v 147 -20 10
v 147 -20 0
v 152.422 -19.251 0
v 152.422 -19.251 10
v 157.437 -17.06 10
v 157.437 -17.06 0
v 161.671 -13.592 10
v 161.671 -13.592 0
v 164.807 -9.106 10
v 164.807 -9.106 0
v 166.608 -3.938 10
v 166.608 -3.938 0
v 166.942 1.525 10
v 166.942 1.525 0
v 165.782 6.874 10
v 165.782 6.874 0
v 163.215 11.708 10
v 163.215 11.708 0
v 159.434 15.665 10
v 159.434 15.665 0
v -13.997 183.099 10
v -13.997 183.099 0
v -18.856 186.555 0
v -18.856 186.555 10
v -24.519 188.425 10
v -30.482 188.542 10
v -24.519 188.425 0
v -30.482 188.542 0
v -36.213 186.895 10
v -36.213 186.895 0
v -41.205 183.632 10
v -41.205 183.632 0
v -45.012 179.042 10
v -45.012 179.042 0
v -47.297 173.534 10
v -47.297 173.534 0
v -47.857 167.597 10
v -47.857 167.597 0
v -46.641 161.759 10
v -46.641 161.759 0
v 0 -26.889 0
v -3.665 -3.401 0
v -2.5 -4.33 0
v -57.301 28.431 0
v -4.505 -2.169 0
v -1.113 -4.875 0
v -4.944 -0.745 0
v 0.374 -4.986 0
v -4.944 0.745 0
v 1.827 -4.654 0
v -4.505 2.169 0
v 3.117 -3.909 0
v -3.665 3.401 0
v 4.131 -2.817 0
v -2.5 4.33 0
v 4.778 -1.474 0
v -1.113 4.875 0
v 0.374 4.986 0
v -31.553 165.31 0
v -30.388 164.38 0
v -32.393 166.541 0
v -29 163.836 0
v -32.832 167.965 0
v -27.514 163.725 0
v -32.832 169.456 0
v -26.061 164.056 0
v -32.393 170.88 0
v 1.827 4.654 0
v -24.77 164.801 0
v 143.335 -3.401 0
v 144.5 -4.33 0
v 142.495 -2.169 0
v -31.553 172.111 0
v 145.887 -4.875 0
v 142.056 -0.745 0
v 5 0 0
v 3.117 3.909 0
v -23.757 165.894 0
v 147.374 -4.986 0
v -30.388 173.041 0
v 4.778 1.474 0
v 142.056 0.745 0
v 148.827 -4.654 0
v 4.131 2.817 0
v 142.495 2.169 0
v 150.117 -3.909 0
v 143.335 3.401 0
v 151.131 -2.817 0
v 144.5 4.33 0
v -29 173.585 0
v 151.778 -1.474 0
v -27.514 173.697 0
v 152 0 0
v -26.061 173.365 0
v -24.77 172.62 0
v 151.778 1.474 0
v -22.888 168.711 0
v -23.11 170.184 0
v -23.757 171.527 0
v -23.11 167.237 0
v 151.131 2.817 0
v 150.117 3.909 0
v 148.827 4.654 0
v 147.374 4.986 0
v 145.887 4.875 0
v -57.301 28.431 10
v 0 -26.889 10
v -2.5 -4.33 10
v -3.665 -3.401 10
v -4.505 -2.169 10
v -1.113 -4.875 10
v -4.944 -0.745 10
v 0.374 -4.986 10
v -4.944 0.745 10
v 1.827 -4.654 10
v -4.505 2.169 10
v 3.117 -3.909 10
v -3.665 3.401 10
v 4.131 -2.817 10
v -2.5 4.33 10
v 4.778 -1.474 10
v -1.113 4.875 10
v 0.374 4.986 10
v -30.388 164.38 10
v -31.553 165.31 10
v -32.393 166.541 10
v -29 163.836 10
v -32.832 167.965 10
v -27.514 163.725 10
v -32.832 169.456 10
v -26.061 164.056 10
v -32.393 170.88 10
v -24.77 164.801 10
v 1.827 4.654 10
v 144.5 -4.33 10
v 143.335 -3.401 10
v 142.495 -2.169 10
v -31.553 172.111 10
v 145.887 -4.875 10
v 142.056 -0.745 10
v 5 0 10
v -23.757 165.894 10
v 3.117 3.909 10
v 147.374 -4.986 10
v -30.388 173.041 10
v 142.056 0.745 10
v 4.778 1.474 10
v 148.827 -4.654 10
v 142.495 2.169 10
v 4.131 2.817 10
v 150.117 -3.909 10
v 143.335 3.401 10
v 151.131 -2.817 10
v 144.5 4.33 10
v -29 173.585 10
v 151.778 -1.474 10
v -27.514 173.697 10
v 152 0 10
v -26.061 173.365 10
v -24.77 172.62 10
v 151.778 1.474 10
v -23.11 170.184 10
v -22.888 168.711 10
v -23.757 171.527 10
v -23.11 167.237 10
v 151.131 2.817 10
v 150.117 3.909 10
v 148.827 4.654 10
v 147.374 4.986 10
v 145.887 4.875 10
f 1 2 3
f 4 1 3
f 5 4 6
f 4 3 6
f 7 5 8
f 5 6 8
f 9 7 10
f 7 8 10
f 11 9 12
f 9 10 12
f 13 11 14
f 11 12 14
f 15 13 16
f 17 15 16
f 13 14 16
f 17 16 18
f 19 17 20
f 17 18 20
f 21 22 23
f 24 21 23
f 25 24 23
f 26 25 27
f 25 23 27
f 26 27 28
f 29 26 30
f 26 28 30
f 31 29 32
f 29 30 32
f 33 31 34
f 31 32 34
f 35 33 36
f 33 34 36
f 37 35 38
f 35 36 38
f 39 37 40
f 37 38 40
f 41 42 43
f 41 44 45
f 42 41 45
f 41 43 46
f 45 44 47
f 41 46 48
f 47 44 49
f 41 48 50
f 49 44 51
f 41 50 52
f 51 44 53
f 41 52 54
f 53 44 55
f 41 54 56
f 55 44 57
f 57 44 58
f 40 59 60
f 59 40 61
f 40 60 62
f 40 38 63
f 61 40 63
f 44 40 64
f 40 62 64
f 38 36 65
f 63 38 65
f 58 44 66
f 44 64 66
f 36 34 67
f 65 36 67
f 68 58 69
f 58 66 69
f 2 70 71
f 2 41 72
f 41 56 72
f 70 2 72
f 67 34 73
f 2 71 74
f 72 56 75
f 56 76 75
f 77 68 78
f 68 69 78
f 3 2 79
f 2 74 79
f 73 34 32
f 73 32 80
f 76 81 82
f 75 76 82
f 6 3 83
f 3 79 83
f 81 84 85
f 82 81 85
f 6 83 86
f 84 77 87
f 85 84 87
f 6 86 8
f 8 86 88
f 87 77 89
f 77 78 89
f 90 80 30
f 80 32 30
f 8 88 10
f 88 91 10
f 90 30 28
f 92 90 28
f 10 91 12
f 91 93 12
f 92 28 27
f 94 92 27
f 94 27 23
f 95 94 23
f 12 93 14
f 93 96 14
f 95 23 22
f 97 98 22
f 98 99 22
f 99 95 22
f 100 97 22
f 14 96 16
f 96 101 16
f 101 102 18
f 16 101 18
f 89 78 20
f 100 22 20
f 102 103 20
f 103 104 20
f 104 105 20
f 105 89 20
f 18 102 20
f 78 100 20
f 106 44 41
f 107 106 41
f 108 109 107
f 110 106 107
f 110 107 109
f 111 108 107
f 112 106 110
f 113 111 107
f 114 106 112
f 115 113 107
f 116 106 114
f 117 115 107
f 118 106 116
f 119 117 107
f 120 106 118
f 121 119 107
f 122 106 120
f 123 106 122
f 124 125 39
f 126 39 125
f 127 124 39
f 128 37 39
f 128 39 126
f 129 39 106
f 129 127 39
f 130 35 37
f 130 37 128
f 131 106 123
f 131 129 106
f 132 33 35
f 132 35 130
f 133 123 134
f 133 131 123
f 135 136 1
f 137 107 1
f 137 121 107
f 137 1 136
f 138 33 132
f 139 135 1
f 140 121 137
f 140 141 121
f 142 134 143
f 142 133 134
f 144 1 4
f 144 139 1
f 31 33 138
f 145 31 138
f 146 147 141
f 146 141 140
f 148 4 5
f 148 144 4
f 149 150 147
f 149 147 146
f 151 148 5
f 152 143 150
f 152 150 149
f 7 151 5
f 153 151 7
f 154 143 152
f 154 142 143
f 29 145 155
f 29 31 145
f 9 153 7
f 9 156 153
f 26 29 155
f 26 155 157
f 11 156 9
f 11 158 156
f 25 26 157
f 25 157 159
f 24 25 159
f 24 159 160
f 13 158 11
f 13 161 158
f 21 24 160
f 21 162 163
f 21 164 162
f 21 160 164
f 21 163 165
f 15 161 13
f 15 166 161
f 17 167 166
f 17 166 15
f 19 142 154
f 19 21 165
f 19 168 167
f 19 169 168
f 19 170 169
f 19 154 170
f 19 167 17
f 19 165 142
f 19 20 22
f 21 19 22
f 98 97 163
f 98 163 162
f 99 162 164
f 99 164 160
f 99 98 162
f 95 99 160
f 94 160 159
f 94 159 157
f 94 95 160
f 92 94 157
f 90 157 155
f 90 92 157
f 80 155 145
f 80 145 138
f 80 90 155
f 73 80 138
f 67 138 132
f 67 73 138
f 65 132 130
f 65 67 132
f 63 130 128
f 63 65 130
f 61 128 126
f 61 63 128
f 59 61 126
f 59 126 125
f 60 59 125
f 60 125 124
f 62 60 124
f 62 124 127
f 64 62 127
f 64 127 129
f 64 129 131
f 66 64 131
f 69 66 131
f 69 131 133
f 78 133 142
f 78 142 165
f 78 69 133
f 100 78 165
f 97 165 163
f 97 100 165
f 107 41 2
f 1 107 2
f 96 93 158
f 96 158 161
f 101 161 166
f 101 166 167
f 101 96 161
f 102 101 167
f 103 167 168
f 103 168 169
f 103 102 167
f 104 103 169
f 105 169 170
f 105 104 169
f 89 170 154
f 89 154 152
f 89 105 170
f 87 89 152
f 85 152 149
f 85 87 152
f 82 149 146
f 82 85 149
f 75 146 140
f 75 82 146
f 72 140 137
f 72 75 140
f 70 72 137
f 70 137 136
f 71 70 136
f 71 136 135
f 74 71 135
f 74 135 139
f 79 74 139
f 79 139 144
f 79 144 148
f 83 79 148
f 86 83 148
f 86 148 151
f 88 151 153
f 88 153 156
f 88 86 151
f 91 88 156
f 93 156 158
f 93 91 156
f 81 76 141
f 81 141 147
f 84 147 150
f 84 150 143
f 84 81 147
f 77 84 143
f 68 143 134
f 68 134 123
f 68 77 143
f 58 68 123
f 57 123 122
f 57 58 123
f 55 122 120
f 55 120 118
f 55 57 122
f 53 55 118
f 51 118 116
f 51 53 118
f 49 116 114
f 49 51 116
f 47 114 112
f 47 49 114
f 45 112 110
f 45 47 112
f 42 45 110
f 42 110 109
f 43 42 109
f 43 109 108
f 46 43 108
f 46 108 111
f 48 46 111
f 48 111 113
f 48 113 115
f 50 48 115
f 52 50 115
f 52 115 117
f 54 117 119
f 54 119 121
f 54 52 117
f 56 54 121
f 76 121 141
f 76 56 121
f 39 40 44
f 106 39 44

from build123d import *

# Parameters (mm, degrees)
F0_R     = 5
F1_DEPTH = 10


with BuildPart() as f1:
    # F0 (on Top) → F1 (new body)
    with BuildSketch(Plane.XY):
        with BuildLine():
            Line((159.43381, 15.66526), (-13.99655, 183.09931))
            ThreePointArc((-13.99655, 183.09931), (-38.831476, 185.45084), (-46.64062, 161.758636))
            Line((-46.64062, 161.758636), (-57.301475, 28.431364))
            Line((-57.301475, 28.431364), (0, -26.888927))
            Line((0, -26.888927), (147, -20))
            ThreePointArc((147, -20), (165.885248, -6.583875), (159.43381, 15.66526))
        make_face()
        Circle(F0_R, mode=Mode.SUBTRACT)
        with Locations((147, 0)):
            Circle(F0_R, mode=Mode.SUBTRACT)
        with Locations((-27.887755, 168.710619)):
            Circle(F0_R, mode=Mode.SUBTRACT)
    extrude(amount=F1_DEPTH)


solid = f1.part
